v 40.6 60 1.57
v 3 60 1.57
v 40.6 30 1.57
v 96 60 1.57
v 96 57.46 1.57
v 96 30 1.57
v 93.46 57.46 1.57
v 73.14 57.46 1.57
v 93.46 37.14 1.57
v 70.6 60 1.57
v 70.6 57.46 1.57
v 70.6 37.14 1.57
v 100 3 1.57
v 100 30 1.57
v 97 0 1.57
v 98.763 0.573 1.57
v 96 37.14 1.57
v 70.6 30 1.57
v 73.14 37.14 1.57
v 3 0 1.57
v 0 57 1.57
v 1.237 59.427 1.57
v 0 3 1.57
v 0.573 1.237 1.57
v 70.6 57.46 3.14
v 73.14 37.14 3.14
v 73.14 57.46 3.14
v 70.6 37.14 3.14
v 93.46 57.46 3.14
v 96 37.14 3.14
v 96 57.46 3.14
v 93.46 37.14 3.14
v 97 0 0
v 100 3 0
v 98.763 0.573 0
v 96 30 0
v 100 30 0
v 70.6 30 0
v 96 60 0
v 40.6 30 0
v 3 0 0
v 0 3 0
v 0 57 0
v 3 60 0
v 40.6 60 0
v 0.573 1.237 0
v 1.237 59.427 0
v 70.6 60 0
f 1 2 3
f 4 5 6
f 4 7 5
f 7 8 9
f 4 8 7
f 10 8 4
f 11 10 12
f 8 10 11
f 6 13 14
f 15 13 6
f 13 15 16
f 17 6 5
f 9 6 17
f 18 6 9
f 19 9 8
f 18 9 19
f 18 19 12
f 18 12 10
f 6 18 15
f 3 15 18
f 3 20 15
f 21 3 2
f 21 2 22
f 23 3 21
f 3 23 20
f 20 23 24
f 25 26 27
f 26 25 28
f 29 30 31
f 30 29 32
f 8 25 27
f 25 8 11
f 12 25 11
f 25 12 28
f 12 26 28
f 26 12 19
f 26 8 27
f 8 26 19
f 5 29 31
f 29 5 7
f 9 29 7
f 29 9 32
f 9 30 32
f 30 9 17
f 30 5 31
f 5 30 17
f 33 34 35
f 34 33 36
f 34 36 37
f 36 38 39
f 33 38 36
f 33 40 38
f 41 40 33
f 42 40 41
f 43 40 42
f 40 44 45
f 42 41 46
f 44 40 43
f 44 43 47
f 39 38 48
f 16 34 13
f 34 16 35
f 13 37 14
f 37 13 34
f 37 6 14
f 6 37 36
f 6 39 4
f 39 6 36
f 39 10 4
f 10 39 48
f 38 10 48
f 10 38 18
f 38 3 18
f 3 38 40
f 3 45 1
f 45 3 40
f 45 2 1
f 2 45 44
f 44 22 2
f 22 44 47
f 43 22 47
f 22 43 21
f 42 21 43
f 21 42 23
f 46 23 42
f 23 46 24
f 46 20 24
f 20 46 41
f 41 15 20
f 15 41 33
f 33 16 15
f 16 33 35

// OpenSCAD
color("black")
translate([96-25.4,60-9*2.54,1.57])
linear_extrude(1.57)
union() {
  square([2.54,8*2.54]);
  translate([9*2.54,0,0])
    square([2.54,8*2.54]);
}

color("green")
linear_extrude(1.57) 
difference() {
  offset(r=3) offset(delta=-3) polygon(
  [[0,0],[0,60],[100,60],
  [100,0],[0,0]]);
  translate([96,30,0]) square([4,30]);
  translate([96-(25.4)-30,30,0]) square([30,30]);
}
